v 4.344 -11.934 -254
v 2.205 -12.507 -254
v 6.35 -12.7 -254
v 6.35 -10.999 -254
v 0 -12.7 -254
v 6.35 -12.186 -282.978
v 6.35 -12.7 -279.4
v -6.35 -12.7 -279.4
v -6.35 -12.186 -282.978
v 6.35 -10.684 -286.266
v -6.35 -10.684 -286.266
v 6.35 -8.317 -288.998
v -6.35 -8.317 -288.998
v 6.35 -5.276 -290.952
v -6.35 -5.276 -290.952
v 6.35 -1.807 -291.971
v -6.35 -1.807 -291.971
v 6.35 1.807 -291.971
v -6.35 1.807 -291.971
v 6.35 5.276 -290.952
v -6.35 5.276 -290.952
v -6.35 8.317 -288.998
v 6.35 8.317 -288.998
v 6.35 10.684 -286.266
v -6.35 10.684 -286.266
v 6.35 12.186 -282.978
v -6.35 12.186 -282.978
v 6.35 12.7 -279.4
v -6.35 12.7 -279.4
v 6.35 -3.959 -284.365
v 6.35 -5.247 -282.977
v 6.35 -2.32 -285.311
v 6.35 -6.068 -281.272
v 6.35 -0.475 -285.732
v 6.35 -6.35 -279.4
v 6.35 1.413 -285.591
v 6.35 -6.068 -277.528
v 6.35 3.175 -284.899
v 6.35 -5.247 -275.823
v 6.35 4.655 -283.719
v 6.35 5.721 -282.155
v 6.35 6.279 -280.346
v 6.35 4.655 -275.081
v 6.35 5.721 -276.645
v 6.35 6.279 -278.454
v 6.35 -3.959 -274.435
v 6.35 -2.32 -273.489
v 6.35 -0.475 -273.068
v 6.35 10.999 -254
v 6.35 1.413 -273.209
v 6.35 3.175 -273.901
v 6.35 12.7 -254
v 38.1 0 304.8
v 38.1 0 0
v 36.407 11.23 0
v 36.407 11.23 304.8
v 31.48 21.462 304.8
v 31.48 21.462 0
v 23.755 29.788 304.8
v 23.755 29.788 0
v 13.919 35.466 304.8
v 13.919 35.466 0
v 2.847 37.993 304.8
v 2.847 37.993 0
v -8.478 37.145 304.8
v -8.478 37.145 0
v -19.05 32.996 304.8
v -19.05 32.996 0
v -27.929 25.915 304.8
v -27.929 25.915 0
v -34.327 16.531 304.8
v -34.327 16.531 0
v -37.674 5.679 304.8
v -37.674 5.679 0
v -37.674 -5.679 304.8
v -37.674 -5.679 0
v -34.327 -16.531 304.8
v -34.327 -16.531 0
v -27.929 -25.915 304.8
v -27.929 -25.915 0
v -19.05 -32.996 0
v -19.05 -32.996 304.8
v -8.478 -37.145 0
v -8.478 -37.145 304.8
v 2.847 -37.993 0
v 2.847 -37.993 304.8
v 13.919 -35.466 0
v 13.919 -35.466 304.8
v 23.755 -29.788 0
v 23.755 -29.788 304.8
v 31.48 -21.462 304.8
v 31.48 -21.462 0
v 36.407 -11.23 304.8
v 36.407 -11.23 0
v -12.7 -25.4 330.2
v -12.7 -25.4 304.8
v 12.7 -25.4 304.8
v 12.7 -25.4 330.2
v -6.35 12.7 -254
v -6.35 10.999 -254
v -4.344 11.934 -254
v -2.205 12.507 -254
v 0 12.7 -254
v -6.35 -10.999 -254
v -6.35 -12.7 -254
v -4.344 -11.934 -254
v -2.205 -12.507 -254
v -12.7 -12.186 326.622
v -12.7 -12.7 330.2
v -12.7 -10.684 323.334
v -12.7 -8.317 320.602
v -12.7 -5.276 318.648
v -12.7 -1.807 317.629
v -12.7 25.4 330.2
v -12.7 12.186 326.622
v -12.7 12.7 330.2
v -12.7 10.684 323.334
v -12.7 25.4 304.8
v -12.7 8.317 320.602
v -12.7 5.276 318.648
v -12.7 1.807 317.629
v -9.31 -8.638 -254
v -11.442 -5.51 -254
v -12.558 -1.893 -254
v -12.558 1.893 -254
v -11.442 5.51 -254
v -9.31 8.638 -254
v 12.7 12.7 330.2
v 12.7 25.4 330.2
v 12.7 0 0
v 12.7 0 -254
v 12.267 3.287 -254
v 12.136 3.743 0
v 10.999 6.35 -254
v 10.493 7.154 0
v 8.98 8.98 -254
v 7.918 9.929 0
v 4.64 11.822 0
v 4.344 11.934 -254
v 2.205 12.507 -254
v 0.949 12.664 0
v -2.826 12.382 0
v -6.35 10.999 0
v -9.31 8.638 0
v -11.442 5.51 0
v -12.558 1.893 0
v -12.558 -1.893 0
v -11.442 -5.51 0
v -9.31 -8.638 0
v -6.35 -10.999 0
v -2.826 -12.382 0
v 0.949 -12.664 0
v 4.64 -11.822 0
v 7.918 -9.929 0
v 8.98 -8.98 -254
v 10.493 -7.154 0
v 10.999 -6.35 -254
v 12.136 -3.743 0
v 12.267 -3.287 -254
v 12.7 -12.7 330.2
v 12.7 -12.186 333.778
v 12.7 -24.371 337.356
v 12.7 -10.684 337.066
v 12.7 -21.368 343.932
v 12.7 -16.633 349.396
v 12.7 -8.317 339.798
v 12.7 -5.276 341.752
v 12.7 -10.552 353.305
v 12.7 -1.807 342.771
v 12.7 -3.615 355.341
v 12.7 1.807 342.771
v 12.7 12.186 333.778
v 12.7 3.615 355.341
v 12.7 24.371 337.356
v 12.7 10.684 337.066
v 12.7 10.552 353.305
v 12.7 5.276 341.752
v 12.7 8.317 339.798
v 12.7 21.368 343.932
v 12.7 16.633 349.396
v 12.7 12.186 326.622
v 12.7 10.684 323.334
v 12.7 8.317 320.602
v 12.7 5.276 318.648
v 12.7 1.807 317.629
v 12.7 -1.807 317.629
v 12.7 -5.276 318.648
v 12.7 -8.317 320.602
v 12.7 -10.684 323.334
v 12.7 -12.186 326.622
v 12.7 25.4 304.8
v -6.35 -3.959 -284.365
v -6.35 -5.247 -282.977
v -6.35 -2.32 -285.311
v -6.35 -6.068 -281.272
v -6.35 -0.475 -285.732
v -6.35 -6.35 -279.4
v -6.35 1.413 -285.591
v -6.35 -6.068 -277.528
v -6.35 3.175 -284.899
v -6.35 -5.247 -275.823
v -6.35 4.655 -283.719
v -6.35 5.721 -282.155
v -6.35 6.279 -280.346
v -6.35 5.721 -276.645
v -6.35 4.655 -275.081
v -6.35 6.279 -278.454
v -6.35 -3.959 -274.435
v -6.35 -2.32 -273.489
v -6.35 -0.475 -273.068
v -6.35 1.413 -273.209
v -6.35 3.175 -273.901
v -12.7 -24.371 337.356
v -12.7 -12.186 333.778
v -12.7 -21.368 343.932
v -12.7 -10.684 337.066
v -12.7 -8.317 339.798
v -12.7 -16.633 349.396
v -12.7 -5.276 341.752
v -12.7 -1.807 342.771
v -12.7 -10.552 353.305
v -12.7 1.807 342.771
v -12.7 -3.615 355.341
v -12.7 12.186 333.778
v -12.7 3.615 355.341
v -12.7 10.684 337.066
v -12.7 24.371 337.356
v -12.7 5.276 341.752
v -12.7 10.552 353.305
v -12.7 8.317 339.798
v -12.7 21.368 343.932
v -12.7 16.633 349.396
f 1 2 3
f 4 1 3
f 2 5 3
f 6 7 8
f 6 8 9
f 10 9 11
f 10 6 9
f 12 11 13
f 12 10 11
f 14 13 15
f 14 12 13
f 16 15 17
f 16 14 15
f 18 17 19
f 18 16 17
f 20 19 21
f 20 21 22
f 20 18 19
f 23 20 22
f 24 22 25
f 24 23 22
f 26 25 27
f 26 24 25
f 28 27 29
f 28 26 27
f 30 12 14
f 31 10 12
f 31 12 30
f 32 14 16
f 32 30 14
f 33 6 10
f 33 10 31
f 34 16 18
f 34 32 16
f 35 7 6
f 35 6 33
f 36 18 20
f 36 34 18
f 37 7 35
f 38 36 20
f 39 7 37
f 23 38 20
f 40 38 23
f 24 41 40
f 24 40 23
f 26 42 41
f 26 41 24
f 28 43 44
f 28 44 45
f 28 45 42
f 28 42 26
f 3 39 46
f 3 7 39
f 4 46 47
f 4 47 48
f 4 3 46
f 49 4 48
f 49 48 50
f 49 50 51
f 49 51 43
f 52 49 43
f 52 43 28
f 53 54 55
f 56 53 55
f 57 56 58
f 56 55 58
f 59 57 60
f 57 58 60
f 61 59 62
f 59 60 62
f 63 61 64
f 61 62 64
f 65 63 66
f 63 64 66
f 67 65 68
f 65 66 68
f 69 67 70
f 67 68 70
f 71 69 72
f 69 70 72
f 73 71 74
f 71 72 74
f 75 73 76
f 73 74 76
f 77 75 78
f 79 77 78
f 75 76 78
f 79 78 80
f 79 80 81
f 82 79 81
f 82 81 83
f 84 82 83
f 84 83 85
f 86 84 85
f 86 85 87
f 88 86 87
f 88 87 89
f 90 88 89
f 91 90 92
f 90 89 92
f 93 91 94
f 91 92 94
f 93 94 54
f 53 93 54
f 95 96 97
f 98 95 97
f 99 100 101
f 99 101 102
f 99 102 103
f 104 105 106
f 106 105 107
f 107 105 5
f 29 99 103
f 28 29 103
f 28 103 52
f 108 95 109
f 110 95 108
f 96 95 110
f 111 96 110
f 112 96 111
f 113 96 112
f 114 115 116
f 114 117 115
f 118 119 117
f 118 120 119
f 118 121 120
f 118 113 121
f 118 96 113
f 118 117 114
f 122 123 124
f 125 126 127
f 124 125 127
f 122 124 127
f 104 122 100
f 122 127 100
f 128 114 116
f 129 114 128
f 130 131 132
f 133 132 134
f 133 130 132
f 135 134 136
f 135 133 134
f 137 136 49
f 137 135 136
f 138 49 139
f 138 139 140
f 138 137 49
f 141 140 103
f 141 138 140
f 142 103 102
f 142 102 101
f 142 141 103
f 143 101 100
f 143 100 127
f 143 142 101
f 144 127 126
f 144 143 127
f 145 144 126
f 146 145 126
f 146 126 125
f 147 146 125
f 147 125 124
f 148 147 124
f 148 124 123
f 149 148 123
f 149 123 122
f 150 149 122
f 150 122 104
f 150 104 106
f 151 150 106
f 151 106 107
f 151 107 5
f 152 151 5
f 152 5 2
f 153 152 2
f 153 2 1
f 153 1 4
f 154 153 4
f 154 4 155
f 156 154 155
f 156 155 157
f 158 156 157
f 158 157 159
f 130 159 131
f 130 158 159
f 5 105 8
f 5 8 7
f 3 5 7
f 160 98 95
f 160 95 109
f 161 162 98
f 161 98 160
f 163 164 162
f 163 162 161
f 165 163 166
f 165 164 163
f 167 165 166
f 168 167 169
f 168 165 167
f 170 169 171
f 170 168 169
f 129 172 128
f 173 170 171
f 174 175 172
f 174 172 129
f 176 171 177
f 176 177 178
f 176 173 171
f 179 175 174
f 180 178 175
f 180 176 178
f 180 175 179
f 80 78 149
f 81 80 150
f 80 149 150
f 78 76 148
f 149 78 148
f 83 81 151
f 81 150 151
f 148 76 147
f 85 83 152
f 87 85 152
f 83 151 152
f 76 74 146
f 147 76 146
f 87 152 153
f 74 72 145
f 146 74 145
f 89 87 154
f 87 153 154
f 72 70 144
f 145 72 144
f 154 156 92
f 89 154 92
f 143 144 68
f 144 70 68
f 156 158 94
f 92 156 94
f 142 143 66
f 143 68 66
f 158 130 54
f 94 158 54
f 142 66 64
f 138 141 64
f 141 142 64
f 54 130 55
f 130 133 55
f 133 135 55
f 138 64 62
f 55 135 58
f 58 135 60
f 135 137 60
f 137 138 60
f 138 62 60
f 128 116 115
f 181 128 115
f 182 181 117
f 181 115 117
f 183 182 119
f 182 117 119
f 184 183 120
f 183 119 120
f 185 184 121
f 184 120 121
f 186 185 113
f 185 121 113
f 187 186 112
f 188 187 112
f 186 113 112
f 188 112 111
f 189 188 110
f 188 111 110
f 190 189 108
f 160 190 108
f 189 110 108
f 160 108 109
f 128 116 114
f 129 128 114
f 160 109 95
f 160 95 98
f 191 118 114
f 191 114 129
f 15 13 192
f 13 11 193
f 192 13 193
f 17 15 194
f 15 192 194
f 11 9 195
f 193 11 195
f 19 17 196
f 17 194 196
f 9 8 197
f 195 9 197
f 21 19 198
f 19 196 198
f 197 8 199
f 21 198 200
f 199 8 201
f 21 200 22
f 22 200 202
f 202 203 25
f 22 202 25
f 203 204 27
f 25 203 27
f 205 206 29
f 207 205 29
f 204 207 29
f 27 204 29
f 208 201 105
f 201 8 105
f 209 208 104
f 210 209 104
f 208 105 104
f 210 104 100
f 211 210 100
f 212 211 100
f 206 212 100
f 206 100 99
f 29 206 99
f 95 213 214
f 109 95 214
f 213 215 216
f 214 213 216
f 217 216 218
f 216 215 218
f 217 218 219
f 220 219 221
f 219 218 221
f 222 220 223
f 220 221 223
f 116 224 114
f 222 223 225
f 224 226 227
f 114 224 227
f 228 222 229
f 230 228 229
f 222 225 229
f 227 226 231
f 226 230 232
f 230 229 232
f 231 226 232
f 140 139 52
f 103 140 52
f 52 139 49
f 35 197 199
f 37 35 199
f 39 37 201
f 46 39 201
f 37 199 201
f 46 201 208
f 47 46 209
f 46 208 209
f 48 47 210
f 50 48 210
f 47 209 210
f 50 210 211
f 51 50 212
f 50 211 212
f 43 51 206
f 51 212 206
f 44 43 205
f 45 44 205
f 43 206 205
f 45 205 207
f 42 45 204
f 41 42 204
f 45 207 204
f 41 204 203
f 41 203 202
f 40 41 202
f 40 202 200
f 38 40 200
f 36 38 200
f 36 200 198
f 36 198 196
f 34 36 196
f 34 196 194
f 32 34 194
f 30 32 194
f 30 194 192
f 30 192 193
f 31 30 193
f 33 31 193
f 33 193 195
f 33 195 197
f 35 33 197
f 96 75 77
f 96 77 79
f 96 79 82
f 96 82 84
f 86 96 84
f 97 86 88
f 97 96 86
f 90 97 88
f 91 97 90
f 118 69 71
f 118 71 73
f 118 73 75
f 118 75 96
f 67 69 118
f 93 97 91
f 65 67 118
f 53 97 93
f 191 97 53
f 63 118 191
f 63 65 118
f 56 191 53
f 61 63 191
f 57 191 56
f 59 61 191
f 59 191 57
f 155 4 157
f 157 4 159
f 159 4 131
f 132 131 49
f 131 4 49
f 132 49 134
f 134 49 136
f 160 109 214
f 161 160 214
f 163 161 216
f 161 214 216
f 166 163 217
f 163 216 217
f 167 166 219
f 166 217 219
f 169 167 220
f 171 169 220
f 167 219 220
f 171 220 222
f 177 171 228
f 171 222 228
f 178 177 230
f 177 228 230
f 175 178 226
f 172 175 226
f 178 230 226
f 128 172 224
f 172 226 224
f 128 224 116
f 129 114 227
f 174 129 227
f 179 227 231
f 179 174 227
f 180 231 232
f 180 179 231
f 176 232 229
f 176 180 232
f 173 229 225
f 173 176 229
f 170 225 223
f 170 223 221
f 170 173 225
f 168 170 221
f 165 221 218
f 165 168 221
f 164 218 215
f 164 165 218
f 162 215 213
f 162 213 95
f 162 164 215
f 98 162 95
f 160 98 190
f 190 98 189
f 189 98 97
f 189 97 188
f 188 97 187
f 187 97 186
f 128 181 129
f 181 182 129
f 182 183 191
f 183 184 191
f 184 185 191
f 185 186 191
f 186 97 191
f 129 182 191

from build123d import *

# Parameters (mm, degrees)
F0_R      = 12.7
F1_DEPTH  = 254
F2_R      = 38.1
F3_DEPTH  = 304.8
F4_W      = 25.4
F4_H      = 50.8
F5_DEPTH  = 25.4
F7_DEPTH  = 25.4
F9_D      = 25.4
F9_2_D    = 25.4
F10_W     = 12.7
F10_H     = 25.4
F11_DEPTH = 25.4
F13_DEPTH = 12.7
F15_D     = 12.7


with BuildPart() as f1:
    # F0 (on Top) → F1 (new body)
    with BuildSketch(Plane.XY):
        Circle(F0_R)
    extrude(amount=-F1_DEPTH)

    # F2 (on Top) → F3 (join)
    with BuildSketch(Plane.XY):
        Circle(F2_R)
    extrude(amount=F3_DEPTH)

    # F4 (on face) → F5 (join)
    with BuildSketch(Plane.XY.offset(304.8)):
        Rectangle(F4_W, F4_H)
    extrude(amount=F5_DEPTH)

    # F9 (through all)
    with Locations(Plane.YZ.offset(12.7)):
        with Locations((0, 330.2)):
            Hole(F9_D / 2)

    # F10 (on face) → F11 (join)
    with BuildSketch(Plane(origin=(0, 0, -254), x_dir=(1, 0, 0), z_dir=(0, 0, -1))):
        Rectangle(F10_W, F10_H)
    extrude(amount=F11_DEPTH)

    # F12 (on face) → F13 (join)
    with BuildSketch(Plane.YZ.offset(6.35)):
        with BuildLine():
            Line((12.7, -279.4), (-12.7, -279.4))
            ThreePointArc((-12.7, -279.4), (0, -292.1), (12.7, -279.4))
        make_face()
    extrude(amount=-F13_DEPTH)

    # F15 (through all)
    with Locations(Plane.YZ.offset(6.35)):
        with Locations((0, -279.4)):
            Hole(F15_D / 2)


with BuildPart() as f7:
    # F6 (on face) → F7 (new body)
    with BuildSketch(Plane.YZ.offset(12.7)):
        with BuildLine():
            Line((-25.4, 330.2), (25.4, 330.2))
            ThreePointArc((25.4, 330.2), (0, 355.6), (-25.4, 330.2))
        make_face()
    extrude(amount=-F7_DEPTH)

    # F9#2 (through all)
    with Locations(Plane.YZ.offset(12.7)):
        with Locations((0, 330.2)):
            Hole(F9_2_D / 2)


solid = Compound([f1.part, f7.part])
